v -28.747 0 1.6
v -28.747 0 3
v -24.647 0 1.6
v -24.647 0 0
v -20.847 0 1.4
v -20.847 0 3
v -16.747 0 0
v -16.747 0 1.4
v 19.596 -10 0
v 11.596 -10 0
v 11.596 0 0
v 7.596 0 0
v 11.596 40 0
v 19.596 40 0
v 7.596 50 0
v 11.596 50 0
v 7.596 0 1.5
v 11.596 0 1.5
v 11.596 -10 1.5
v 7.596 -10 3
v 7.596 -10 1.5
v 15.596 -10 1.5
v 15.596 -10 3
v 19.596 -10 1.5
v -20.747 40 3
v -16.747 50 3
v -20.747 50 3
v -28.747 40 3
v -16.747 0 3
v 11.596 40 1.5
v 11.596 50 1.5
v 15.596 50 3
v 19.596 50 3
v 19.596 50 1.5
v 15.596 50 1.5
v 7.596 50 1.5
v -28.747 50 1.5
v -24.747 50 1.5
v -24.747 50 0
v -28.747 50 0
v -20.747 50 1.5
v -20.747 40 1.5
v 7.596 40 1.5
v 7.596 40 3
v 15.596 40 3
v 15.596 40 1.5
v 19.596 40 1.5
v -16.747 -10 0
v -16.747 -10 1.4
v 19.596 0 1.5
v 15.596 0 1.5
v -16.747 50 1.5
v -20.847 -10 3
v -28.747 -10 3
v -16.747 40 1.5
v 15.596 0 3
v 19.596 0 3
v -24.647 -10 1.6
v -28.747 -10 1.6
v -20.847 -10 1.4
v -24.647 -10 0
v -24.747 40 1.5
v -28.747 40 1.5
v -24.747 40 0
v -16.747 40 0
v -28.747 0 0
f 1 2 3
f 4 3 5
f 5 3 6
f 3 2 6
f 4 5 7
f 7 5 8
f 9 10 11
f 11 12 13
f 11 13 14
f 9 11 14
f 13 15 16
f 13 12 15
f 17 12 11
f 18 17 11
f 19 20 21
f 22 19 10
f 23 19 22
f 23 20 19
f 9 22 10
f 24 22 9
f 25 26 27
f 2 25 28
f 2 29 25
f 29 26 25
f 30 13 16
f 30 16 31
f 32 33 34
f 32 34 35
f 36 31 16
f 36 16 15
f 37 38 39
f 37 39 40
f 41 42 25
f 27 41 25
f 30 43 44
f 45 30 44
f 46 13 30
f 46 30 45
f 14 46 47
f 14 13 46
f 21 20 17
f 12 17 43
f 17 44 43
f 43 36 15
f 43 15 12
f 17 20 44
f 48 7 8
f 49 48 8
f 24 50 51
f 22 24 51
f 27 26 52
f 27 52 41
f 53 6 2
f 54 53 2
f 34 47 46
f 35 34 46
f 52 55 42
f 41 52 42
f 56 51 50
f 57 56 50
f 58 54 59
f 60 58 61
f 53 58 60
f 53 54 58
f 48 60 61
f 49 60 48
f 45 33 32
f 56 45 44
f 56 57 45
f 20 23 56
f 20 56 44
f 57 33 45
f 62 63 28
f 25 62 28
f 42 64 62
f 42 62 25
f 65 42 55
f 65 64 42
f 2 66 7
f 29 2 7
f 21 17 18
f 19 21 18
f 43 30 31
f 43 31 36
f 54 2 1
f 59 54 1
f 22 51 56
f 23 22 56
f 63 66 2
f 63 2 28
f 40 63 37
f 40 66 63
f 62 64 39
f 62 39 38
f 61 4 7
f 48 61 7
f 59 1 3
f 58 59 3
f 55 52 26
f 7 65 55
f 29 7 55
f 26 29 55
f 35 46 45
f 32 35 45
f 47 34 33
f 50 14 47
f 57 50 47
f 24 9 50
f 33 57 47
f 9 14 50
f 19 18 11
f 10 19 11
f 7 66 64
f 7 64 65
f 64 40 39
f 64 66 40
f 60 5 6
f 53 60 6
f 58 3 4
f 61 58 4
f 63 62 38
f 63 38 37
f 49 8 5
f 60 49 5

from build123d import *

# Parameters (mm, degrees)
F0_W     = 12
F0_H     = 40
F1_DEPTH = 3
F4_DEPTH = 10
F6_W     = 4
F6_H     = 1.5
F7_DEPTH = 10
F5_W     = 4
F5_H     = 1.5


# Not quite as in the source:
# - a feature names something its author has since deleted; it is built from what else it names


with BuildPart() as f1:
    # F0 (on Top) → F1 (new body)
    with BuildSketch(Plane.XY):
        with Locations((-22.7465788424, 20)):
            Rectangle(F0_W, F0_H)
    extrude(amount=F1_DEPTH)

    # F6 (on face) → F7 (join)
    with BuildSketch(Plane(origin=(0, 40, 0), x_dir=(-1, 0, 0), z_dir=(0, 1, 0))):
        with Locations((18.7465788424, 2.25)):
            Rectangle(F6_W, F6_H)
        with Locations((26.7465788424, 0.75)):
            Rectangle(F6_W, F6_H)
    extrude(amount=F7_DEPTH)


with BuildPart() as f1b:
    # F0 (on Top) → F1, piece 2 (new body)
    with BuildSketch(Plane.XY):
        with Locations((13.5962403789, 20)):
            Rectangle(F0_W, F0_H)
    extrude(amount=F1_DEPTH)

    # F3 (on face) → F4 (join)
    with BuildSketch(Plane.XZ):
        Polygon((15.5962403789, 3), (7.5962403789, 3), (7.5962403789, 1.5), (11.5962403789, 1.5), (11.5962403789, 0), (19.5962403789, 0), (19.5962403789, 1.5), (15.5962403789, 1.5), align=None)
    extrude(amount=F4_DEPTH)

    # F5 (on face) → F7, piece 2 (join)
    with BuildSketch(Plane(origin=(0, 40, 0), x_dir=(-1, 0, 0), z_dir=(0, 1, 0))):
        with Locations((-17.5962403789, 2.25)):
            Rectangle(F5_W, F5_H)
        with Locations((-9.5962403789, 0.75)):
            Rectangle(F5_W, F5_H)
    extrude(amount=F7_DEPTH)


with BuildPart() as f4:
    # F2 (on face) → F4, piece 2 (new body)
    with BuildSketch(Plane.XZ):
        Polygon((-20.8465788424, 3), (-28.7465788424, 3), (-28.7465788424, 1.6), (-24.6465788424, 1.6), (-24.6465788424, 0), (-16.7465788424, 0), (-16.7465788424, 1.4), (-20.8465788424, 1.4), align=None)
    extrude(amount=F4_DEPTH)


solid = Compound([f1.part, f1b.part, f4.part])
